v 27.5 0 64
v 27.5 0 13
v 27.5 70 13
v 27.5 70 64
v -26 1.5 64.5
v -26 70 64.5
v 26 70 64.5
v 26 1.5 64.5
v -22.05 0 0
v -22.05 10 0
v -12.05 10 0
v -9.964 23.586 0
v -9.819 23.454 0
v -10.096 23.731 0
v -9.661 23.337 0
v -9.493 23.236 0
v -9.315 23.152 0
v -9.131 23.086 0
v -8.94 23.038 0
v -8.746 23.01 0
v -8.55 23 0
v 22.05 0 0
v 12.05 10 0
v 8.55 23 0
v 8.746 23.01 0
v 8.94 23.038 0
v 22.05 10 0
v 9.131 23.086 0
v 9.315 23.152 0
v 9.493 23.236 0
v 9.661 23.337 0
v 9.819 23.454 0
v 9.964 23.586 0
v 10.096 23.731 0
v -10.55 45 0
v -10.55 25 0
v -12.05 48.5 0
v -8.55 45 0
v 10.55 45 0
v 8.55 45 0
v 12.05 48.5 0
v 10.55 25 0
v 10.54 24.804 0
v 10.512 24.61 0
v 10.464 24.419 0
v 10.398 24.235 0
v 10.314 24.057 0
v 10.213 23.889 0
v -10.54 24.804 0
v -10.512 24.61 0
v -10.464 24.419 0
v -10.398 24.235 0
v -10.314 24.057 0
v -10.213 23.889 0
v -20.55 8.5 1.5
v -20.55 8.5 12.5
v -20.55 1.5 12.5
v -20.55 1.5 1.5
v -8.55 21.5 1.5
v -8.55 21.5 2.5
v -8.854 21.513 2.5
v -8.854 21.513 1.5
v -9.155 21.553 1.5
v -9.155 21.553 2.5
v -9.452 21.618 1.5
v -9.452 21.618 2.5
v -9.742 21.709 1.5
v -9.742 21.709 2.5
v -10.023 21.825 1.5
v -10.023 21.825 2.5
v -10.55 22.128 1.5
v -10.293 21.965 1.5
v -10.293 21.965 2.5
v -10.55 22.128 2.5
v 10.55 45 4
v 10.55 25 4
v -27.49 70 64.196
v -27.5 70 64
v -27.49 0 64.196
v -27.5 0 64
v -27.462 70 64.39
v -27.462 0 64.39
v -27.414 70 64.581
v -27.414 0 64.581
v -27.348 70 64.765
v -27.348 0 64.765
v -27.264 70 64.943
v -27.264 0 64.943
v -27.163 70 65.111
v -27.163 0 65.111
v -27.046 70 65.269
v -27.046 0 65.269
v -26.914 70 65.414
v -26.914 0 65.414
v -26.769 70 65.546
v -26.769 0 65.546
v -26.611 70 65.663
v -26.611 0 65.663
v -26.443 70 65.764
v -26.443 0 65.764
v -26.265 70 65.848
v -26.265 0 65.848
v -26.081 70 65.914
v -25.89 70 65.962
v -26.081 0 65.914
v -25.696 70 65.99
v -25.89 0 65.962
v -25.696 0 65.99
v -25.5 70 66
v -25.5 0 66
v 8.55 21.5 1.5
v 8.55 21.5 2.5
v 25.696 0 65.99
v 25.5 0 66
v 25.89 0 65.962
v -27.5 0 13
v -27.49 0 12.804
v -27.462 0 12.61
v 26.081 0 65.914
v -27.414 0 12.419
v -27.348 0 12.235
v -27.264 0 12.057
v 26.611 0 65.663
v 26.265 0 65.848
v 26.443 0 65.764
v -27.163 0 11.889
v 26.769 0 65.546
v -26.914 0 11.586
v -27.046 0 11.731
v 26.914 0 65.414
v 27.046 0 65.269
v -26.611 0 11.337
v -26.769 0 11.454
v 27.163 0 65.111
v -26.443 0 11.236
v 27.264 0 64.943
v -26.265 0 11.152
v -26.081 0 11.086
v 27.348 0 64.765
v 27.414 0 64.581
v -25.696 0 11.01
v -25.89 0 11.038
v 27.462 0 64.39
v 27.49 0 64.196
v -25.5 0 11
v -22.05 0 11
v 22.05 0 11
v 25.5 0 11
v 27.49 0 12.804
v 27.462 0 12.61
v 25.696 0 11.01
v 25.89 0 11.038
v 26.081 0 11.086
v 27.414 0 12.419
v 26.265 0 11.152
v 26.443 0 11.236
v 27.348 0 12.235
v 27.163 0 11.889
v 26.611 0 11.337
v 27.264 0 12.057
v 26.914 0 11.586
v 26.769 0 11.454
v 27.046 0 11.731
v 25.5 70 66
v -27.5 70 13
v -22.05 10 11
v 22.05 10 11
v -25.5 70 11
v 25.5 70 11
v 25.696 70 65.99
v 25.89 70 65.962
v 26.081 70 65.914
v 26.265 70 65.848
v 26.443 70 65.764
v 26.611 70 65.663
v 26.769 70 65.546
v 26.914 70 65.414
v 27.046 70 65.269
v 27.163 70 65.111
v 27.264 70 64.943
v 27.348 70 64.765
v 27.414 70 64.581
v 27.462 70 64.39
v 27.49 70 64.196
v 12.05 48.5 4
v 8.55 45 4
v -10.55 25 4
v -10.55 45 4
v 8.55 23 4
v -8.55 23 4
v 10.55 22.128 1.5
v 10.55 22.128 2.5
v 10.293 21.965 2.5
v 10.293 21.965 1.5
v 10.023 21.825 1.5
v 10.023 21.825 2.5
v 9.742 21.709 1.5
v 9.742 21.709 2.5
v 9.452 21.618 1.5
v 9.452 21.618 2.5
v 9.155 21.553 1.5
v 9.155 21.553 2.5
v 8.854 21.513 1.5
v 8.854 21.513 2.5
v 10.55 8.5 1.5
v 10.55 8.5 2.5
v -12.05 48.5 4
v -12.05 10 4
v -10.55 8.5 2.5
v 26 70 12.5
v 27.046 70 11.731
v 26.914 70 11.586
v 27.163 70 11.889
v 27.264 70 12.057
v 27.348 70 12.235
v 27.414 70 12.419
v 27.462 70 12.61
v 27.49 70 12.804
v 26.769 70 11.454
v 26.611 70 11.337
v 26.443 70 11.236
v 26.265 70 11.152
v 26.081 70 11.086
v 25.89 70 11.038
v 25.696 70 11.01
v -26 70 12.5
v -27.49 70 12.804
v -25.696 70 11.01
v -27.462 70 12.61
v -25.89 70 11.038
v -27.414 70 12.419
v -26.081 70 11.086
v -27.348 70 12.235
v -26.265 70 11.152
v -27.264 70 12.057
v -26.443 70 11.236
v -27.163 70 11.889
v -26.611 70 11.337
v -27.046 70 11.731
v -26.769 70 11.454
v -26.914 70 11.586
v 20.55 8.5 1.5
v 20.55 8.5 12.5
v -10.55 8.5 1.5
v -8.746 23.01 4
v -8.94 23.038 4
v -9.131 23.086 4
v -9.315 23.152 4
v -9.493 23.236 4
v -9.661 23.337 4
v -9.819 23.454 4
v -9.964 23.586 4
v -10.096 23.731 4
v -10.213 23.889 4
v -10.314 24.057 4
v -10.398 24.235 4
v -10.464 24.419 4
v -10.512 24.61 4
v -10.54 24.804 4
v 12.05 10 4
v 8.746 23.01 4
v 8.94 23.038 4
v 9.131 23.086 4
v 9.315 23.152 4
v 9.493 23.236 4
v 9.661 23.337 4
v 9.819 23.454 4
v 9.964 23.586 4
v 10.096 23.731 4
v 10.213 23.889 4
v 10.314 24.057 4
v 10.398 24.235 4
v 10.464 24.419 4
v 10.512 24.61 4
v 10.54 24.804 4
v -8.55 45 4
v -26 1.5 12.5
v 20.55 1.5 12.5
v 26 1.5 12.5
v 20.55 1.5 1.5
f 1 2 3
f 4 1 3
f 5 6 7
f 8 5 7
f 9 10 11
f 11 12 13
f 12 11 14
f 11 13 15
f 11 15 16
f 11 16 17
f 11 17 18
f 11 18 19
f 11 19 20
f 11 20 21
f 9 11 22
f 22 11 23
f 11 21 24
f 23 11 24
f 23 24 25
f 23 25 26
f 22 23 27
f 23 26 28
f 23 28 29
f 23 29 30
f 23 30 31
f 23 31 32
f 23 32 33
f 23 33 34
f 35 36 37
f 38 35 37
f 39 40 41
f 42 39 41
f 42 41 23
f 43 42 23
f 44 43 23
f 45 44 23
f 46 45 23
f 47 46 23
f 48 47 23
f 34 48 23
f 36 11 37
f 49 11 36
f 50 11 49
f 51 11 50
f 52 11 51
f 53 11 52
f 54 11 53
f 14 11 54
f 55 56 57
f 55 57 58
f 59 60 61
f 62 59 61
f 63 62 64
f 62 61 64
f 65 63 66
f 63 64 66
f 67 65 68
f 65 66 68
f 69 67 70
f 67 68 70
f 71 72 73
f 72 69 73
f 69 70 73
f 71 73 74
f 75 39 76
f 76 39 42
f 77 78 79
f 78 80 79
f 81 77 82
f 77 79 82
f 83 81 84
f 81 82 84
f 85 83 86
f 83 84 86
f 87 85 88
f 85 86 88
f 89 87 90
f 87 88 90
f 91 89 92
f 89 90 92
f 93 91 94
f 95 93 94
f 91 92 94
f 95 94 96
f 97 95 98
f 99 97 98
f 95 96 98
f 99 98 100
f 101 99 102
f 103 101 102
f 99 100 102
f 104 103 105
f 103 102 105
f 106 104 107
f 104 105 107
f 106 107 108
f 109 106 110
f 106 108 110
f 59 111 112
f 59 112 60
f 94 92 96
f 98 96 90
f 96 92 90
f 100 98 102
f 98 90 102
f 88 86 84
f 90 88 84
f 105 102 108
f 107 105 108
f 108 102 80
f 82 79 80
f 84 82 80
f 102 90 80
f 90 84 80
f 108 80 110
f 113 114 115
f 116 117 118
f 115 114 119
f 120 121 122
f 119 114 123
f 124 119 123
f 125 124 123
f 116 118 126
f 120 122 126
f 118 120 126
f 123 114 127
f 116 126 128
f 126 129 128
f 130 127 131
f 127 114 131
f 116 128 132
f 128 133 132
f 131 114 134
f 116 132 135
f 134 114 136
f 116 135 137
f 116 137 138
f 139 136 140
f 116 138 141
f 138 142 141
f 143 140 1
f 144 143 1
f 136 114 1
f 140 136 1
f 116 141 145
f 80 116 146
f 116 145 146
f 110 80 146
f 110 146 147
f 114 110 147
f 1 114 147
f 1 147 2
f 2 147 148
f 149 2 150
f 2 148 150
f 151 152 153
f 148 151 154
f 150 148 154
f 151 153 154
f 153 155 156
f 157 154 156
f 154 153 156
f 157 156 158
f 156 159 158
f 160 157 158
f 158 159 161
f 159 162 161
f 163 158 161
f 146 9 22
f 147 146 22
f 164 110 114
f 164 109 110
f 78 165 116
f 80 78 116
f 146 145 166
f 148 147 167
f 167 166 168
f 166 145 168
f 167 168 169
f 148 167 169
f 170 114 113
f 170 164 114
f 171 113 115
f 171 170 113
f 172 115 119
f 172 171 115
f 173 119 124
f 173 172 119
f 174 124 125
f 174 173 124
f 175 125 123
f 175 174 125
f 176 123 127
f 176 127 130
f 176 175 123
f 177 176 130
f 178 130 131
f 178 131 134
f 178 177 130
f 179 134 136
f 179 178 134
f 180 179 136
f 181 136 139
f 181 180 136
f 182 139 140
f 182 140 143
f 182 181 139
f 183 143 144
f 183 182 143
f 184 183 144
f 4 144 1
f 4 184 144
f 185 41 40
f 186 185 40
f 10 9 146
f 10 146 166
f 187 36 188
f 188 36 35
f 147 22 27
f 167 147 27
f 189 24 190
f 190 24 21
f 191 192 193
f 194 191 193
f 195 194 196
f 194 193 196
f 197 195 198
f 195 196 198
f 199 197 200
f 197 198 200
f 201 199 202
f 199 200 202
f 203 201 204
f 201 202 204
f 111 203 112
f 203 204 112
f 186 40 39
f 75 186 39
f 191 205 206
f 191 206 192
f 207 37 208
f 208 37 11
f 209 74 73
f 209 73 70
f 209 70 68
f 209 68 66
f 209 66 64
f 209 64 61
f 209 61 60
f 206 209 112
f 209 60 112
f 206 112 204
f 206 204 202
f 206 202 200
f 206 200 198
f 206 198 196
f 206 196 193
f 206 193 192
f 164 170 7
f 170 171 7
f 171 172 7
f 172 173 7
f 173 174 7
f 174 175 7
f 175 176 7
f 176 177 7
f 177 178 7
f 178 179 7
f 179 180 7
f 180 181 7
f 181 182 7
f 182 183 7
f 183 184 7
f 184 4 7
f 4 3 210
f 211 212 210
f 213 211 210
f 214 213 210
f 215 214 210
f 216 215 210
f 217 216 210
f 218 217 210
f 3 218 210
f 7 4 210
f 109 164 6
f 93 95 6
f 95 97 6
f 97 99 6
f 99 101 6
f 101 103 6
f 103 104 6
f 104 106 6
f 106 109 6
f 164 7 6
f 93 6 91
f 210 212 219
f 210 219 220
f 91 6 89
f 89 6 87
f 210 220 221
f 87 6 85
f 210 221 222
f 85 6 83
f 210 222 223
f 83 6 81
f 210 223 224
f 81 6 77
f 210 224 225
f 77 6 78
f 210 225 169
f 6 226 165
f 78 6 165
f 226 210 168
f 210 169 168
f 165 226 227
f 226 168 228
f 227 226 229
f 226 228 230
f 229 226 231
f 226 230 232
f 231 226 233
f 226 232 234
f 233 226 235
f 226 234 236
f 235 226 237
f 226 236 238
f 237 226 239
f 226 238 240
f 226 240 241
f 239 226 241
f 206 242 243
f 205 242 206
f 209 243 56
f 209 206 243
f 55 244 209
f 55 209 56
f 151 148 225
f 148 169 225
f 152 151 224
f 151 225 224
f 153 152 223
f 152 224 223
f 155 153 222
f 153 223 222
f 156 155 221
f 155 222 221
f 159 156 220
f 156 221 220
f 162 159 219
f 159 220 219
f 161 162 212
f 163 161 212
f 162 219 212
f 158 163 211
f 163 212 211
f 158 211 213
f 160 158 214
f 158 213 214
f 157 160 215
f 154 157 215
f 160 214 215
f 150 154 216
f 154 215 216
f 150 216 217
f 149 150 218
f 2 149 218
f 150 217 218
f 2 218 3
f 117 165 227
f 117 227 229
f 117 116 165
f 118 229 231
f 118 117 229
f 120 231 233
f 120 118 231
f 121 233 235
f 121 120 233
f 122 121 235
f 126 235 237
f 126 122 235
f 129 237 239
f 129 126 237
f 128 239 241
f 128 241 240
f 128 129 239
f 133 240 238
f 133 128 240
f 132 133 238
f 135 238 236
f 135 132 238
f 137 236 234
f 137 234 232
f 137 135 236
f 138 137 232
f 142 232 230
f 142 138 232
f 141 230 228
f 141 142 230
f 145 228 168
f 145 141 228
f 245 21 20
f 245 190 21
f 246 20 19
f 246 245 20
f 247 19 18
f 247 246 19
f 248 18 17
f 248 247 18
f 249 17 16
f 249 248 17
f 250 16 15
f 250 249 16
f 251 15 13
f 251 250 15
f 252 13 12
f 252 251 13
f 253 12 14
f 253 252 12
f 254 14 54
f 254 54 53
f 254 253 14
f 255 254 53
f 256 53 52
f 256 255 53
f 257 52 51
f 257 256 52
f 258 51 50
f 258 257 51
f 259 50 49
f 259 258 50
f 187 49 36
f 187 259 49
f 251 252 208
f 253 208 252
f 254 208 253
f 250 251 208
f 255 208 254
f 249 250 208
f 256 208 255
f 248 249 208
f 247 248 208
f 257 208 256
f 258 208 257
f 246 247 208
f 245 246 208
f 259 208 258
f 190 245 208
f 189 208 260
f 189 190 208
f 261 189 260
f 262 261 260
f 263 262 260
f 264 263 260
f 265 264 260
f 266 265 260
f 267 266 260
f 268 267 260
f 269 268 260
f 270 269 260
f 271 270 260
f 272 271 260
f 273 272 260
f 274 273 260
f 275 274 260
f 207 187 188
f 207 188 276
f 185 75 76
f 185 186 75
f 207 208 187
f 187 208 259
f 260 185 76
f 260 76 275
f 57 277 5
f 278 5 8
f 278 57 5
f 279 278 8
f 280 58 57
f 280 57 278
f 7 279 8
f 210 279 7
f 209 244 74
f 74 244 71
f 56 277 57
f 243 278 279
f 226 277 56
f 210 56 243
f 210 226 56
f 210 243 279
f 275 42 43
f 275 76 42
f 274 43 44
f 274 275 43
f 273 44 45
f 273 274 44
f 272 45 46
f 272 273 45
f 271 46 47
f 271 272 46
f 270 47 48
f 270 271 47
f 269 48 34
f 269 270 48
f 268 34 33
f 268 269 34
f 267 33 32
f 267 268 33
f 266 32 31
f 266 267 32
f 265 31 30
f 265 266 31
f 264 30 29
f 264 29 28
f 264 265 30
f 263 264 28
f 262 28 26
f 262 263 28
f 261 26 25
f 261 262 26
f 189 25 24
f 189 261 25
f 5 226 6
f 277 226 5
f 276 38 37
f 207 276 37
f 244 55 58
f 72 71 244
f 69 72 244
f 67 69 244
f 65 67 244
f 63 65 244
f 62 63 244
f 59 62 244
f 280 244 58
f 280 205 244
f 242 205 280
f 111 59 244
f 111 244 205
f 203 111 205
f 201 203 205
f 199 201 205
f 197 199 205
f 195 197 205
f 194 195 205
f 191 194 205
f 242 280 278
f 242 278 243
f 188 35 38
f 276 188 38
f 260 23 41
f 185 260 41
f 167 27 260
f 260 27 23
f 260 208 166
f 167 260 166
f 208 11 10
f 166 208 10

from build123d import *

# Parameters (mm, degrees)
F1_DEPTH    = 4
F2_R        = 2
F0_W        = 10
F0_H        = 10
F3_DEPTH    = 11
F4_W        = 44.1
F4_H        = 10
F5_DEPTH    = 55
F6_T        = 1.5
F6_T3_DEPTH = 13
F6_T5_DEPTH = 47.1
F6_T7_DEPTH = 7
F6_T9_DEPTH = 27.1
F7_R        = 2


# Not quite as in the source:
# - a shell that OpenCascade refuses in one call is made with other operations: the cavity is built on its own and cut out


with BuildPart() as f1:
    # F0 (on Top) → F1 (new body)
    with BuildSketch(Plane.XY):
        Polygon((-12.05, 0), (0, 0), (12.05, 0), (12.05, 10), (-12.05, 10), align=None)
        Polygon((-12.05, 48.5), (-12.05, 10), (12.05, 10), (12.05, 48.5), (8.55, 45), (10.55, 45), (10.55, 23), (0, 23), (-10.55, 23), (-10.55, 45), (-8.55, 45), align=None)
    extrude(amount=F1_DEPTH)

    # F2
    f2_edges = [f1.edges().sort_by_distance(p)[0] for p in [
        (-10.55, 23, 2),
        (10.55, 23, 2),
    ]]
    fillet(f2_edges, radius=F2_R)

    # F0 (on Top) → F3 (join)
    with BuildSketch(Plane.XY):
        with Locations((17.05, 5)):
            Rectangle(F0_W, F0_H)
        Polygon((-12.05, 0), (0, 0), (12.05, 0), (12.05, 10), (-12.05, 10), align=None)
        with Locations((-17.05, 5)):
            Rectangle(F0_W, F0_H)
    extrude(amount=F3_DEPTH)

    # F4 (on face) → F5 (join)
    with BuildSketch(Plane.XY.offset(11)):
        Polygon((-27.5, 70), (-27.5, 0), (-22.05, 0), (-22.05, 10), (22.05, 10), (22.05, 0), (27.5, 0), (27.5, 70), align=None)
        with Locations((0, 5)):
            Rectangle(F4_W, F4_H)
    extrude(amount=F5_DEPTH)

    # F6: shell of thickness 1.5, made by hand


with BuildPart() as f6_core1:
    # F6_t2: copy of F1
    add(f1.part)

    # the walls: a layer under each face that stays
    f6_faces = [f6_core1.faces().sort_by_distance(p)[0] for p in [
        (-27.5, 35, 38.5),
        (0, 0, 33),
        (0, 35, 11),
        (0, 35, 66),
        (27.5, 35, 38.5),
        (22.05, 5, 5.5),
        (0, 10, 5.5),
        (-22.05, 5, 5.5),
        (-14.7, 8.0833333333, 0),
        (12.05, 29.25, 2),
        (-8.0333333333, 16.4166666667, 4),
        (-12.05, 29.25, 2),
        (10.55, 35, 2),
        (9.9642135624, 23.5857864376, 2),
        (0, 23, 2),
        (-9.9642135624, 23.5857864376, 2),
        (-10.55, 35, 2),
        (-9.55, 45, 2),
        (-10.3, 46.75, 2),
        (10.3, 46.75, 2),
        (9.55, 45, 2),
    ]]
    thicken(f6_faces, amount=-F6_T, mode=Mode.SUBTRACT)

    # F6_s4 → F6_t3 (cut)
    with BuildSketch(Plane.XZ.offset(-11.5)):
        Polygon((22.065, 10.985), (22.05, 12.5), (20.55, 12.5), (20.55, 11), align=None)
        Polygon((-22.065, 10.985), (-22.05, 12.5), (-20.55, 12.5), (-20.55, 11), align=None)
    extrude(amount=F6_T3_DEPTH, mode=Mode.SUBTRACT)

    # F6_s6 → F6_t5 (cut)
    with BuildSketch(Plane.YZ.offset(-23.55)):
        Polygon((10.015, 10.985), (10, 12.5), (8.5, 12.5), (8.5, 11), align=None)
    extrude(amount=F6_T5_DEPTH, mode=Mode.SUBTRACT)

    # F6_s8 → F6_t7 (cut)
    with BuildSketch(Plane.XY.offset(-1.5)):
        Polygon((12.065, 10.015), (12.05, 8.5), (10.55, 8.5), (10.55, 10), align=None)
        Polygon((-12.065, 10.015), (-12.05, 8.5), (-10.55, 8.5), (-10.55, 10), align=None)
        Polygon((10.535, 44.985), (12.05, 45), (12.05, 46.5), (10.55, 46.5), align=None)
        Polygon((-10.535, 44.985), (-12.05, 45), (-12.05, 46.5), (-10.55, 46.5), align=None)
    extrude(amount=F6_T7_DEPTH, mode=Mode.SUBTRACT)

    # F6_s10 → F6_t9 (cut)
    with BuildSketch(Plane.YZ.offset(-13.55)):
        Polygon((10.015, 4.015), (8.5, 4), (8.5, 2.5), (10, 2.5), align=None)
    extrude(amount=F6_T9_DEPTH, mode=Mode.SUBTRACT)


with BuildPart() as f1_1:
    add(f1.part)

    # what is left inside the walls is the cavity
    f6_cavity = [f6_core1.part.solids().sort_by_distance(p)[0] for p in [
        (-25.985, 35.75, 47.166667),
    ]]
    add(f6_cavity, mode=Mode.SUBTRACT)

    # F7
    f7_edges = [f1_1.edges().sort_by_distance(p)[0] for p in [
        (-27.5, 35, 66),
        (-27.5, 35, 11),
        (27.5, 35, 11),
        (27.5, 35, 66),
    ]]
    fillet(f7_edges, radius=F7_R)


solid = f1_1.part
